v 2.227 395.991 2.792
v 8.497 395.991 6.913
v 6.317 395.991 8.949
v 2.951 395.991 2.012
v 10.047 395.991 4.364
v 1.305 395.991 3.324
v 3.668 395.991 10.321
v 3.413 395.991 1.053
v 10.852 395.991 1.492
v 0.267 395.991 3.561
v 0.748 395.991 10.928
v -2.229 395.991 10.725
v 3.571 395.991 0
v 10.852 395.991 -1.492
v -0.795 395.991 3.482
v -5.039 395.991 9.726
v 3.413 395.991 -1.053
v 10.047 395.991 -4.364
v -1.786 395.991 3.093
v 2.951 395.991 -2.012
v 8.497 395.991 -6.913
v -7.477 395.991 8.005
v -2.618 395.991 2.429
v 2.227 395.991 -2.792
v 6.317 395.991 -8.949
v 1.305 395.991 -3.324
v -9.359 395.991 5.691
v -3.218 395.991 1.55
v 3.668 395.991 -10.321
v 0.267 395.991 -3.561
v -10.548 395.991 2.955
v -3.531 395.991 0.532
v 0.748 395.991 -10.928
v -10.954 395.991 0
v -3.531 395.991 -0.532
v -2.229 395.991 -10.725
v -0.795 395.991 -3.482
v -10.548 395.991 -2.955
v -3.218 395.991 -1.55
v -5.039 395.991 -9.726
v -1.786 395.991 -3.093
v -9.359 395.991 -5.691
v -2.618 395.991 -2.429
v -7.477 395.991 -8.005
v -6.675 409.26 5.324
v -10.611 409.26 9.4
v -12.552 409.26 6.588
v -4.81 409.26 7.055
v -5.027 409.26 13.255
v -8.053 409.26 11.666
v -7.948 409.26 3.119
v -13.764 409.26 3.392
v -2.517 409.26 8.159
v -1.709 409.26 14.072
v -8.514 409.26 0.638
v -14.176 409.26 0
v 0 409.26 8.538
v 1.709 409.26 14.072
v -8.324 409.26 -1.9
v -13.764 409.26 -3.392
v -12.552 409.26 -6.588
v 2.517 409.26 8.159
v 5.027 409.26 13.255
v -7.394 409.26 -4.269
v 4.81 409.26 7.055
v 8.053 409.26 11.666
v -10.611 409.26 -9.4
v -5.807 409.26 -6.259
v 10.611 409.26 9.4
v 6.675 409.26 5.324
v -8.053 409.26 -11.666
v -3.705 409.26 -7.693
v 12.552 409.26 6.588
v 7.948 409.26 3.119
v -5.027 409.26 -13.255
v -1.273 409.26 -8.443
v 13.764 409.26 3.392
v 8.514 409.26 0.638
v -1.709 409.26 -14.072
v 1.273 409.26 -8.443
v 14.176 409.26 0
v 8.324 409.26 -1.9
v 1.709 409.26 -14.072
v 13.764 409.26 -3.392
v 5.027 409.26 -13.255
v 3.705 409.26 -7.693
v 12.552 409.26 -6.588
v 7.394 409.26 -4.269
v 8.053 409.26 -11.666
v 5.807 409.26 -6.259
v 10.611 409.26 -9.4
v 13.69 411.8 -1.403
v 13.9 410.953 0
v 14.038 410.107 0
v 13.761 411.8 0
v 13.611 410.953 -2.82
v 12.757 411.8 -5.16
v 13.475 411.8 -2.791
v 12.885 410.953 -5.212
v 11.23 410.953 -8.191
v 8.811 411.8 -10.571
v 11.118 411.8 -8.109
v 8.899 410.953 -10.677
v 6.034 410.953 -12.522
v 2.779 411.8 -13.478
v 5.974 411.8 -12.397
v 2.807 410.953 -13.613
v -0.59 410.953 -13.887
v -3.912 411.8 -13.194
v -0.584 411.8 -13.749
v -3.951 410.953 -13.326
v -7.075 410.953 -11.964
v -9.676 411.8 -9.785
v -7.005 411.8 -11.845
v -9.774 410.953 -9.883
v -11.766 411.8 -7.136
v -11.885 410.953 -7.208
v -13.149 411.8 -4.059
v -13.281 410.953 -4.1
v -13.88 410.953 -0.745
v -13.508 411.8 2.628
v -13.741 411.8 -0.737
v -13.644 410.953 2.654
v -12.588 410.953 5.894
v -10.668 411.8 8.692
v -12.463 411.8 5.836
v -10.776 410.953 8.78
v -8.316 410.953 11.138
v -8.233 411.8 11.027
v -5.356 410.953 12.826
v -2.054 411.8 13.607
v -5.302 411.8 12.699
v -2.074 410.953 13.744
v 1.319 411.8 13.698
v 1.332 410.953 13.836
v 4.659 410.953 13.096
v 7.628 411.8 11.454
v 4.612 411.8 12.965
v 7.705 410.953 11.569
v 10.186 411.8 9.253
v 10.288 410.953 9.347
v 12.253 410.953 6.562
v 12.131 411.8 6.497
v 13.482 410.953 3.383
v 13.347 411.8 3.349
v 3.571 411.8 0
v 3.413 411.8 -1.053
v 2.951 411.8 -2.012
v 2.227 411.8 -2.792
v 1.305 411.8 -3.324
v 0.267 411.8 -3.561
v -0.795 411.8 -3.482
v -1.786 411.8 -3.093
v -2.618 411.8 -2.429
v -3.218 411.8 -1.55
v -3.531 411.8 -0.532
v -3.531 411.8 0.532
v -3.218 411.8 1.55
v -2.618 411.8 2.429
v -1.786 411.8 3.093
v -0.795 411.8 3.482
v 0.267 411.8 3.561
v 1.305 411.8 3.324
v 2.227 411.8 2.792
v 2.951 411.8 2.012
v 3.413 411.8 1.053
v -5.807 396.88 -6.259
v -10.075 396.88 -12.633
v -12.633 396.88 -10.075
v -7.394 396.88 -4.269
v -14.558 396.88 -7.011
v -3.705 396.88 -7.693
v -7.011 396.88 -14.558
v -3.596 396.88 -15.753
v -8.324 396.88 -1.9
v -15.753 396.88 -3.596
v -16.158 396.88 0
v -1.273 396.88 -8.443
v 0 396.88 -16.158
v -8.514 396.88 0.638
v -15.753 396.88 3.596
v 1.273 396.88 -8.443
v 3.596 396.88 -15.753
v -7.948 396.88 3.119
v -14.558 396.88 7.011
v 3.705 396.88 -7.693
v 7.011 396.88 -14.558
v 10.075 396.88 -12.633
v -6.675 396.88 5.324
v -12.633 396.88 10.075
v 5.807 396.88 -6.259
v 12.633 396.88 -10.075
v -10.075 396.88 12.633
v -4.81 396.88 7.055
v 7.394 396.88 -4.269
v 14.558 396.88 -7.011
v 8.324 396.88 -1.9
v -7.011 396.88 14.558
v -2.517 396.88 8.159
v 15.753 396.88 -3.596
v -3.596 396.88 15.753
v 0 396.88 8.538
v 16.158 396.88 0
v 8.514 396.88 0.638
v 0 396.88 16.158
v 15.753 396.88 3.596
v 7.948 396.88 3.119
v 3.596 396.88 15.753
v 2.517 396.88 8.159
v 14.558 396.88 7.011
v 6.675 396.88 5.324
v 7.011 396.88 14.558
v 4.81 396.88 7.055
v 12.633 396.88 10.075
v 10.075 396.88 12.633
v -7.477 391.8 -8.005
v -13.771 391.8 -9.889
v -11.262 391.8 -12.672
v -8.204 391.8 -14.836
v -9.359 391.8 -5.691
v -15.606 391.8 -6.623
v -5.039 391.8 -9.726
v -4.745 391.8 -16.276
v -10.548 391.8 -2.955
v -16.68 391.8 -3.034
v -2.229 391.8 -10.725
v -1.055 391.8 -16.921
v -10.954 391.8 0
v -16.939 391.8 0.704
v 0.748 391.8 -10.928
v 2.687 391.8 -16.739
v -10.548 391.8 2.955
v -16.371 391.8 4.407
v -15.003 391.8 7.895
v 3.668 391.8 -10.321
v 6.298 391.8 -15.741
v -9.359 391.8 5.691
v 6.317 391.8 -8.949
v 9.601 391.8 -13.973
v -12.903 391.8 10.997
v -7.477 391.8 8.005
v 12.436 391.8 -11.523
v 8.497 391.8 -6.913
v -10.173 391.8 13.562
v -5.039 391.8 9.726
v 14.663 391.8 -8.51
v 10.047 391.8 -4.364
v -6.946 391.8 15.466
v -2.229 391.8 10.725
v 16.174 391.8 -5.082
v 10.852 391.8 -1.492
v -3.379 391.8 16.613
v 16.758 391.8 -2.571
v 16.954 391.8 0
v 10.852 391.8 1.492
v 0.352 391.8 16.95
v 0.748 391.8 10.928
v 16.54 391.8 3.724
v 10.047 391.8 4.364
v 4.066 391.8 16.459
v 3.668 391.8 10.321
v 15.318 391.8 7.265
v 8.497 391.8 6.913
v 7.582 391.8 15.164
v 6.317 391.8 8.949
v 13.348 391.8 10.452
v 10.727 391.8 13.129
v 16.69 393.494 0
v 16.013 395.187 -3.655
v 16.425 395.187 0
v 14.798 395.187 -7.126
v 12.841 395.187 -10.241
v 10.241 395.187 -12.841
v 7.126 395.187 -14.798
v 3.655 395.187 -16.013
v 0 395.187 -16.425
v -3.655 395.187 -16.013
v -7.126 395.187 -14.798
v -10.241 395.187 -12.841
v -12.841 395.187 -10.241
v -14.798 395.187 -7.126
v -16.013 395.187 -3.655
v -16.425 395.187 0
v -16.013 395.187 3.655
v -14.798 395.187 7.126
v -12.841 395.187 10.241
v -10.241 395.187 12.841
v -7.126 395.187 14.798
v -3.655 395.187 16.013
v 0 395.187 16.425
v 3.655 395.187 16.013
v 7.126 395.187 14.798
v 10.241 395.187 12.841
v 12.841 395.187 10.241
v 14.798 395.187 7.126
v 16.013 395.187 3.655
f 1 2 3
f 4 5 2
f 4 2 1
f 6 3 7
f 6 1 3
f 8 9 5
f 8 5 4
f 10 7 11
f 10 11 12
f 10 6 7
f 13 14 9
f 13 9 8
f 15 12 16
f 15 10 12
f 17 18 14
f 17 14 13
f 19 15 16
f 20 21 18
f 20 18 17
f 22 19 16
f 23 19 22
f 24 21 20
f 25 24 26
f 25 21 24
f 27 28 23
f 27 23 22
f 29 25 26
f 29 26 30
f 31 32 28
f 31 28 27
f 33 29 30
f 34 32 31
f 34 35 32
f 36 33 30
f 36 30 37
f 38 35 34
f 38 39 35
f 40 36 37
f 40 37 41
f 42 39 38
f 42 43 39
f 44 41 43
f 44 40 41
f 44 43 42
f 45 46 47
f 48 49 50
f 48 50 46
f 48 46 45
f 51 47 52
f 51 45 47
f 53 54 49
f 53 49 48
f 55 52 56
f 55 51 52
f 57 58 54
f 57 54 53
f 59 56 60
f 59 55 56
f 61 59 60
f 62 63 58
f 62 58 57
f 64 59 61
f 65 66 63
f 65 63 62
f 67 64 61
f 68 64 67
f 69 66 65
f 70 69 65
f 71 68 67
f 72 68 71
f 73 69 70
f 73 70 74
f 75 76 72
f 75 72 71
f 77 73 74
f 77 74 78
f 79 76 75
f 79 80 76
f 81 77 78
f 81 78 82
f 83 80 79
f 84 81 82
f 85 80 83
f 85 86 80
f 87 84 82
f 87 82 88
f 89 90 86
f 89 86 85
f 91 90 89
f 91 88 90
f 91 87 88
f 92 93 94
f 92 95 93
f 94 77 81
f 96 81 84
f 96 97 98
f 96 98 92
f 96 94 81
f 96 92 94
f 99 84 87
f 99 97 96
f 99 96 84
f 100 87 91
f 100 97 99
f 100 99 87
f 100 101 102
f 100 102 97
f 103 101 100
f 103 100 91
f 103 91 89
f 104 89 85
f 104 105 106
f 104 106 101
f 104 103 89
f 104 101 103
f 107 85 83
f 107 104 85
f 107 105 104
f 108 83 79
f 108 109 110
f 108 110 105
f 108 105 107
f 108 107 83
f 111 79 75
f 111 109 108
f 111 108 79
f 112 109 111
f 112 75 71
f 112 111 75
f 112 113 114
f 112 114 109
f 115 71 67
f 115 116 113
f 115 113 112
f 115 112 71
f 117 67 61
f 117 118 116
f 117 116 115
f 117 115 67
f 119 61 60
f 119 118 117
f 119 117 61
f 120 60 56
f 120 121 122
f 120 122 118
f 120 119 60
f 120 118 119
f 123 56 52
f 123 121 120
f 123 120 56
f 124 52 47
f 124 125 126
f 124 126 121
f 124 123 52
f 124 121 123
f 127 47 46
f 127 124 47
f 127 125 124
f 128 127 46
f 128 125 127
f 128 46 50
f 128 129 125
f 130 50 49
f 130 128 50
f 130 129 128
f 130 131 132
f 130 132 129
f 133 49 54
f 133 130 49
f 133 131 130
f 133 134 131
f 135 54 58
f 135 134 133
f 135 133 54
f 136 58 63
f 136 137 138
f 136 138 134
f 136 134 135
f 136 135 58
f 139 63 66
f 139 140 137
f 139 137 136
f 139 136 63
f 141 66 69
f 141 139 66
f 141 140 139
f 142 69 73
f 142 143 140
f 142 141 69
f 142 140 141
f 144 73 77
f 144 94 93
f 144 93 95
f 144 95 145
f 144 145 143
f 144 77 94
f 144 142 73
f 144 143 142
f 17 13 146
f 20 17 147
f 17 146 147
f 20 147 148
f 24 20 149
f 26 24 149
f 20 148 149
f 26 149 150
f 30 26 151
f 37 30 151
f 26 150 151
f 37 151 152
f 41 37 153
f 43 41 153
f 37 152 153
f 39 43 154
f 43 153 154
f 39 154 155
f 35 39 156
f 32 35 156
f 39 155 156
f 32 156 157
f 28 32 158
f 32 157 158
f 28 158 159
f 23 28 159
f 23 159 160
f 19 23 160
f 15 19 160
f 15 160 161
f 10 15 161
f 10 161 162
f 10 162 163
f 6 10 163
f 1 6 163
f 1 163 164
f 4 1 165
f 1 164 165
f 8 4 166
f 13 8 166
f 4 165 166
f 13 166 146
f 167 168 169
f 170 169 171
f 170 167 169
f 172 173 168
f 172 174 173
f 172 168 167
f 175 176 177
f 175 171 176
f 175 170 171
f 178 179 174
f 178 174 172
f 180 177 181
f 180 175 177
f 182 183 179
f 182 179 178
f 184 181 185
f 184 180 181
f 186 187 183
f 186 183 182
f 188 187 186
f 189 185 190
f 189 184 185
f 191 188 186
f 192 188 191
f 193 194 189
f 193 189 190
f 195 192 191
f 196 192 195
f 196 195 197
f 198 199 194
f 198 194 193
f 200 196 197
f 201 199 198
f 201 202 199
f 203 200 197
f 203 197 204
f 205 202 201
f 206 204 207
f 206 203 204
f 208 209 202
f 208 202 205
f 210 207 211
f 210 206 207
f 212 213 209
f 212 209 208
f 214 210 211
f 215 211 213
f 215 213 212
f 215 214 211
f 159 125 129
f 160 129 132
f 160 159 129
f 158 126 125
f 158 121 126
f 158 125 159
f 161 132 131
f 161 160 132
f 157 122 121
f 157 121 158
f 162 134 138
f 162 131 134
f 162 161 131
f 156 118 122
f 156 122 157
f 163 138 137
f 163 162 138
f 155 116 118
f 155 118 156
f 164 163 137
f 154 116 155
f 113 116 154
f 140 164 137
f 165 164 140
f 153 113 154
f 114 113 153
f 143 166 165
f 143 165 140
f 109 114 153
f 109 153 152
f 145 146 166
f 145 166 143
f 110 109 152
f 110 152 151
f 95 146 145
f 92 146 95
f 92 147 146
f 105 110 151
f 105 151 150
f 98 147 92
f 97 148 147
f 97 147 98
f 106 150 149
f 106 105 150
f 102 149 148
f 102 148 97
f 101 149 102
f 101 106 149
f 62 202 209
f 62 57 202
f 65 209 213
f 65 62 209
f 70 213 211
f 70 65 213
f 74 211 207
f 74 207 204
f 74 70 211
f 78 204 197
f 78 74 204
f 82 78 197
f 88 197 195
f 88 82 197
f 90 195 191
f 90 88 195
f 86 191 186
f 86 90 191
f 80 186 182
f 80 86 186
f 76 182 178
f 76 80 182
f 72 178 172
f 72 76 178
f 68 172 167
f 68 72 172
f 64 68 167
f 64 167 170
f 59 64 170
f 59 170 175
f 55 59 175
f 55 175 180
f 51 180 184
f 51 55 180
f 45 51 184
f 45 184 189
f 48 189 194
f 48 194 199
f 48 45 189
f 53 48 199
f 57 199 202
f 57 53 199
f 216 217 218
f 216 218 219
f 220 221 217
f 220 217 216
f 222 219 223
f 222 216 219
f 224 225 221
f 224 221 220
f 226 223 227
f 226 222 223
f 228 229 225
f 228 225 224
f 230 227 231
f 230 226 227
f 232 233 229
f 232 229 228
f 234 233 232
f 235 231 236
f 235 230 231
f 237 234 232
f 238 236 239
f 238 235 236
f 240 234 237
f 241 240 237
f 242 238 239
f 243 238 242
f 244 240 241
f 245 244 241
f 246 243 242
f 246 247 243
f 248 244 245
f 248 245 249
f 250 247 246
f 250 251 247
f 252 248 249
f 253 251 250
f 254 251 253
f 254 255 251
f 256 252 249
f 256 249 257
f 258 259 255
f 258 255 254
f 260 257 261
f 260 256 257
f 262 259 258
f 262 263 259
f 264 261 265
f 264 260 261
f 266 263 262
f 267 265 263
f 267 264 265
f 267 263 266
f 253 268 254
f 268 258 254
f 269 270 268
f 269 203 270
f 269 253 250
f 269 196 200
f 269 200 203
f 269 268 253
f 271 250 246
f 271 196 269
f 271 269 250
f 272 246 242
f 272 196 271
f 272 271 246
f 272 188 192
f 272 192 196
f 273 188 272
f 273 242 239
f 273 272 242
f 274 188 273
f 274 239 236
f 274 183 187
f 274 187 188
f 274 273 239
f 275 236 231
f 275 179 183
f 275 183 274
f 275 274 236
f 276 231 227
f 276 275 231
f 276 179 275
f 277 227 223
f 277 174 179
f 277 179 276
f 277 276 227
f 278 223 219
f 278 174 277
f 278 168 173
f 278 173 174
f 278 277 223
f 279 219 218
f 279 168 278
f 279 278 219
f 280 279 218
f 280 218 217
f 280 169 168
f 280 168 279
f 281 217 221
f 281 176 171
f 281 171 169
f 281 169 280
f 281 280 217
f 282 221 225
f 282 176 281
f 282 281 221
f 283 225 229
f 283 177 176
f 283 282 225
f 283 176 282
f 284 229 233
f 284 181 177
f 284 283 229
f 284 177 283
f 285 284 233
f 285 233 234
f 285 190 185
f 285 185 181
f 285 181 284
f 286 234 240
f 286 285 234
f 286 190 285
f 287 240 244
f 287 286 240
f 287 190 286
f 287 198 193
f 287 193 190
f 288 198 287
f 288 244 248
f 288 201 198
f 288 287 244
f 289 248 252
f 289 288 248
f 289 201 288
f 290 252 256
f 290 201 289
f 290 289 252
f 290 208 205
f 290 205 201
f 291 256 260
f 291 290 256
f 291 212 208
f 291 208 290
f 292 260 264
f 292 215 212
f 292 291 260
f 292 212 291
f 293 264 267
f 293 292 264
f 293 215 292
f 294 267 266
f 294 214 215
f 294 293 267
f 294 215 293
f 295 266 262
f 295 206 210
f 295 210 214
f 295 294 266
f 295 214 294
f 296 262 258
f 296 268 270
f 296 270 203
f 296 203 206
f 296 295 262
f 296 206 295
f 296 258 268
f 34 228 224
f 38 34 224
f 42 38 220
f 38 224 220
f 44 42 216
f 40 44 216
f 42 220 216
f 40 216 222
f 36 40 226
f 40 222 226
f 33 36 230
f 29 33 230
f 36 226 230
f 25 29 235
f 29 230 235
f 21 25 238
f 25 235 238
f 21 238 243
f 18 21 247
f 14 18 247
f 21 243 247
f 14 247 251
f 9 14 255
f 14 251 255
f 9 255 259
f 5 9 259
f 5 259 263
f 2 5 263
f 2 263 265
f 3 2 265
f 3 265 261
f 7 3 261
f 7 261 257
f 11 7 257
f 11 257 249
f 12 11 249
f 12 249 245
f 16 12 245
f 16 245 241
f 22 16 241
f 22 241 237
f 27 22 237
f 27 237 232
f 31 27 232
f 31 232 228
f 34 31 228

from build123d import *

# Parameters (mm, degrees)
SKETCH4_W                                            = 83.533222379
SKETCH4_H                                            = 117.210352631
CUT_EXTRUDE2_DEPTH                                   = 87.376
SKETCH5_W                                            = 27.522537574
SKETCH5_H                                            = 23.027433275
SKETCH5_W_2                                          = 149.909212054
SKETCH5_H_2                                          = 391.8
CUT_EXTRUDE3_DEPTH                                   = 50.8
CBORE_FOR_1_4_BINDING_HEAD_MACHINE_SCREW_D           = 7.14248
CBORE_FOR_1_4_BINDING_HEAD_MACHINE_SCREW_DEPTH       = 37.592
CBORE_FOR_1_4_BINDING_HEAD_MACHINE_SCREW_CBORE_D     = 21.9075
CBORE_FOR_1_4_BINDING_HEAD_MACHINE_SCREW_CBORE_DEPTH = 4.191
CBORE_FOR_1_4_BINDING_HEAD_MACHINE_SCREW_TIP         = 2.145817477


# Read off the part's stored shape, not the designer's step: Shell2, Surface-Fill9
with BuildPart() as part:
    # Sketch2 → Revolve1 (revolve)
    with BuildSketch(Plane.XY):
        with BuildLine():
            ThreePointArc((-51.054, 0), (-38.258433103, 255.279509027), (0, 508))
            Line((0, 508), (0, 0))
            Line((0, 0), (-51.054, 0))
        make_face()
    revolve(axis=Axis((0, 0, 0), (0, 1, 0)))

    # Shell2 outline → Shell2 (revolve, cut)
    with BuildSketch(Plane.XY):
        with BuildLine():
            add(Edge.make_bspline(
                [(0, 488.493083776), (47.244, 246.531114188), (47.244, 0)],
                knots=[6.090357515, 6.090357515, 6.090357515, 6.283185307, 6.283185307, 6.283185307], degree=2, weights=[1, 0.99535578, 1]))
            Line((0, 488.493083776), (0, 0))
            Line((0, 0), (47.244, 0))
        make_face()
    revolve(axis=Axis((0, 0, 0), (0, 1, 0)), mode=Mode.SUBTRACT)

    # Sketch4 → Cut-Extrude2 (cut, symmetric)
    with BuildSketch(Plane(origin=(0, 0, 0), x_dir=(0, 0, -1), z_dir=(1, 0, 0))):
        with Locations((-2.96538755, 490.405176316)):
            Rectangle(SKETCH4_W, SKETCH4_H)
    extrude(amount=CUT_EXTRUDE2_DEPTH, both=True, mode=Mode.SUBTRACT)


with BuildPart() as body_2:
    # Surface-Fill9 outline → Surface-Fill9 (revolve)
    with BuildSketch(Plane.XY):
        with BuildLine():
            Line((0, 0), (47.244, 0))
            ThreePointArc((47.244, 0), (38.017691062, 216.684281379), (10.405552869, 431.8))
            Line((10.405552869, 431.8), (0, 431.8))
            Line((0, 431.8), (0, 0))
        make_face()
    revolve(axis=Axis((0, 0, 0), (0, 1, 0)))

    # Sketch5 → Cut-Extrude3 (cut, symmetric)
    with BuildSketch(Plane.XY):
        with Locations((0, 423.313716638)):
            Rectangle(SKETCH5_W, SKETCH5_H)
        with Locations((0, 195.9)):
            Rectangle(SKETCH5_W_2, SKETCH5_H_2)
    extrude(amount=CUT_EXTRUDE3_DEPTH, both=True, mode=Mode.SUBTRACT)

    # CBORE for 1/4 Binding Head Machine Screw1
    with Locations(Plane(origin=(0, 391.8, 0), x_dir=(-1, 0, 0), z_dir=(0, -1, 0))):
        with Locations((0, 0)):
            CounterBoreHole(CBORE_FOR_1_4_BINDING_HEAD_MACHINE_SCREW_D / 2, CBORE_FOR_1_4_BINDING_HEAD_MACHINE_SCREW_CBORE_D / 2, CBORE_FOR_1_4_BINDING_HEAD_MACHINE_SCREW_CBORE_DEPTH, depth=CBORE_FOR_1_4_BINDING_HEAD_MACHINE_SCREW_DEPTH)
            with Locations((0, 0, -(CBORE_FOR_1_4_BINDING_HEAD_MACHINE_SCREW_DEPTH + CBORE_FOR_1_4_BINDING_HEAD_MACHINE_SCREW_TIP / 2))):  # 118° drill point
                Cone(0, CBORE_FOR_1_4_BINDING_HEAD_MACHINE_SCREW_D / 2, CBORE_FOR_1_4_BINDING_HEAD_MACHINE_SCREW_TIP, mode=Mode.SUBTRACT)

    # Sketch12 → Cut-Revolve5 (revolve, cut)
    with BuildSketch(Plane(origin=(0, 0, 0), x_dir=(0, 0, -1), z_dir=(1, 0, 0))):
        Polygon((-14.175746987, 409.26), (-16.158265967, 396.88), (-8.538265967, 396.88), (-8.538265967, 409.26), align=None)
    revolve(axis=Axis((0, 412.191202115, 0), (0, 1, 0)), mode=Mode.SUBTRACT)


with BuildPart() as cut_revolve5_kept_piece:
    # of the separate pieces the step leaves, the one the design keeps (cut_revolve5_pieces_kept)
    add(body_2.part.solids().sort_by_distance((16.953712849, 391.8, 0))[0])


solid = cut_revolve5_kept_piece.part
